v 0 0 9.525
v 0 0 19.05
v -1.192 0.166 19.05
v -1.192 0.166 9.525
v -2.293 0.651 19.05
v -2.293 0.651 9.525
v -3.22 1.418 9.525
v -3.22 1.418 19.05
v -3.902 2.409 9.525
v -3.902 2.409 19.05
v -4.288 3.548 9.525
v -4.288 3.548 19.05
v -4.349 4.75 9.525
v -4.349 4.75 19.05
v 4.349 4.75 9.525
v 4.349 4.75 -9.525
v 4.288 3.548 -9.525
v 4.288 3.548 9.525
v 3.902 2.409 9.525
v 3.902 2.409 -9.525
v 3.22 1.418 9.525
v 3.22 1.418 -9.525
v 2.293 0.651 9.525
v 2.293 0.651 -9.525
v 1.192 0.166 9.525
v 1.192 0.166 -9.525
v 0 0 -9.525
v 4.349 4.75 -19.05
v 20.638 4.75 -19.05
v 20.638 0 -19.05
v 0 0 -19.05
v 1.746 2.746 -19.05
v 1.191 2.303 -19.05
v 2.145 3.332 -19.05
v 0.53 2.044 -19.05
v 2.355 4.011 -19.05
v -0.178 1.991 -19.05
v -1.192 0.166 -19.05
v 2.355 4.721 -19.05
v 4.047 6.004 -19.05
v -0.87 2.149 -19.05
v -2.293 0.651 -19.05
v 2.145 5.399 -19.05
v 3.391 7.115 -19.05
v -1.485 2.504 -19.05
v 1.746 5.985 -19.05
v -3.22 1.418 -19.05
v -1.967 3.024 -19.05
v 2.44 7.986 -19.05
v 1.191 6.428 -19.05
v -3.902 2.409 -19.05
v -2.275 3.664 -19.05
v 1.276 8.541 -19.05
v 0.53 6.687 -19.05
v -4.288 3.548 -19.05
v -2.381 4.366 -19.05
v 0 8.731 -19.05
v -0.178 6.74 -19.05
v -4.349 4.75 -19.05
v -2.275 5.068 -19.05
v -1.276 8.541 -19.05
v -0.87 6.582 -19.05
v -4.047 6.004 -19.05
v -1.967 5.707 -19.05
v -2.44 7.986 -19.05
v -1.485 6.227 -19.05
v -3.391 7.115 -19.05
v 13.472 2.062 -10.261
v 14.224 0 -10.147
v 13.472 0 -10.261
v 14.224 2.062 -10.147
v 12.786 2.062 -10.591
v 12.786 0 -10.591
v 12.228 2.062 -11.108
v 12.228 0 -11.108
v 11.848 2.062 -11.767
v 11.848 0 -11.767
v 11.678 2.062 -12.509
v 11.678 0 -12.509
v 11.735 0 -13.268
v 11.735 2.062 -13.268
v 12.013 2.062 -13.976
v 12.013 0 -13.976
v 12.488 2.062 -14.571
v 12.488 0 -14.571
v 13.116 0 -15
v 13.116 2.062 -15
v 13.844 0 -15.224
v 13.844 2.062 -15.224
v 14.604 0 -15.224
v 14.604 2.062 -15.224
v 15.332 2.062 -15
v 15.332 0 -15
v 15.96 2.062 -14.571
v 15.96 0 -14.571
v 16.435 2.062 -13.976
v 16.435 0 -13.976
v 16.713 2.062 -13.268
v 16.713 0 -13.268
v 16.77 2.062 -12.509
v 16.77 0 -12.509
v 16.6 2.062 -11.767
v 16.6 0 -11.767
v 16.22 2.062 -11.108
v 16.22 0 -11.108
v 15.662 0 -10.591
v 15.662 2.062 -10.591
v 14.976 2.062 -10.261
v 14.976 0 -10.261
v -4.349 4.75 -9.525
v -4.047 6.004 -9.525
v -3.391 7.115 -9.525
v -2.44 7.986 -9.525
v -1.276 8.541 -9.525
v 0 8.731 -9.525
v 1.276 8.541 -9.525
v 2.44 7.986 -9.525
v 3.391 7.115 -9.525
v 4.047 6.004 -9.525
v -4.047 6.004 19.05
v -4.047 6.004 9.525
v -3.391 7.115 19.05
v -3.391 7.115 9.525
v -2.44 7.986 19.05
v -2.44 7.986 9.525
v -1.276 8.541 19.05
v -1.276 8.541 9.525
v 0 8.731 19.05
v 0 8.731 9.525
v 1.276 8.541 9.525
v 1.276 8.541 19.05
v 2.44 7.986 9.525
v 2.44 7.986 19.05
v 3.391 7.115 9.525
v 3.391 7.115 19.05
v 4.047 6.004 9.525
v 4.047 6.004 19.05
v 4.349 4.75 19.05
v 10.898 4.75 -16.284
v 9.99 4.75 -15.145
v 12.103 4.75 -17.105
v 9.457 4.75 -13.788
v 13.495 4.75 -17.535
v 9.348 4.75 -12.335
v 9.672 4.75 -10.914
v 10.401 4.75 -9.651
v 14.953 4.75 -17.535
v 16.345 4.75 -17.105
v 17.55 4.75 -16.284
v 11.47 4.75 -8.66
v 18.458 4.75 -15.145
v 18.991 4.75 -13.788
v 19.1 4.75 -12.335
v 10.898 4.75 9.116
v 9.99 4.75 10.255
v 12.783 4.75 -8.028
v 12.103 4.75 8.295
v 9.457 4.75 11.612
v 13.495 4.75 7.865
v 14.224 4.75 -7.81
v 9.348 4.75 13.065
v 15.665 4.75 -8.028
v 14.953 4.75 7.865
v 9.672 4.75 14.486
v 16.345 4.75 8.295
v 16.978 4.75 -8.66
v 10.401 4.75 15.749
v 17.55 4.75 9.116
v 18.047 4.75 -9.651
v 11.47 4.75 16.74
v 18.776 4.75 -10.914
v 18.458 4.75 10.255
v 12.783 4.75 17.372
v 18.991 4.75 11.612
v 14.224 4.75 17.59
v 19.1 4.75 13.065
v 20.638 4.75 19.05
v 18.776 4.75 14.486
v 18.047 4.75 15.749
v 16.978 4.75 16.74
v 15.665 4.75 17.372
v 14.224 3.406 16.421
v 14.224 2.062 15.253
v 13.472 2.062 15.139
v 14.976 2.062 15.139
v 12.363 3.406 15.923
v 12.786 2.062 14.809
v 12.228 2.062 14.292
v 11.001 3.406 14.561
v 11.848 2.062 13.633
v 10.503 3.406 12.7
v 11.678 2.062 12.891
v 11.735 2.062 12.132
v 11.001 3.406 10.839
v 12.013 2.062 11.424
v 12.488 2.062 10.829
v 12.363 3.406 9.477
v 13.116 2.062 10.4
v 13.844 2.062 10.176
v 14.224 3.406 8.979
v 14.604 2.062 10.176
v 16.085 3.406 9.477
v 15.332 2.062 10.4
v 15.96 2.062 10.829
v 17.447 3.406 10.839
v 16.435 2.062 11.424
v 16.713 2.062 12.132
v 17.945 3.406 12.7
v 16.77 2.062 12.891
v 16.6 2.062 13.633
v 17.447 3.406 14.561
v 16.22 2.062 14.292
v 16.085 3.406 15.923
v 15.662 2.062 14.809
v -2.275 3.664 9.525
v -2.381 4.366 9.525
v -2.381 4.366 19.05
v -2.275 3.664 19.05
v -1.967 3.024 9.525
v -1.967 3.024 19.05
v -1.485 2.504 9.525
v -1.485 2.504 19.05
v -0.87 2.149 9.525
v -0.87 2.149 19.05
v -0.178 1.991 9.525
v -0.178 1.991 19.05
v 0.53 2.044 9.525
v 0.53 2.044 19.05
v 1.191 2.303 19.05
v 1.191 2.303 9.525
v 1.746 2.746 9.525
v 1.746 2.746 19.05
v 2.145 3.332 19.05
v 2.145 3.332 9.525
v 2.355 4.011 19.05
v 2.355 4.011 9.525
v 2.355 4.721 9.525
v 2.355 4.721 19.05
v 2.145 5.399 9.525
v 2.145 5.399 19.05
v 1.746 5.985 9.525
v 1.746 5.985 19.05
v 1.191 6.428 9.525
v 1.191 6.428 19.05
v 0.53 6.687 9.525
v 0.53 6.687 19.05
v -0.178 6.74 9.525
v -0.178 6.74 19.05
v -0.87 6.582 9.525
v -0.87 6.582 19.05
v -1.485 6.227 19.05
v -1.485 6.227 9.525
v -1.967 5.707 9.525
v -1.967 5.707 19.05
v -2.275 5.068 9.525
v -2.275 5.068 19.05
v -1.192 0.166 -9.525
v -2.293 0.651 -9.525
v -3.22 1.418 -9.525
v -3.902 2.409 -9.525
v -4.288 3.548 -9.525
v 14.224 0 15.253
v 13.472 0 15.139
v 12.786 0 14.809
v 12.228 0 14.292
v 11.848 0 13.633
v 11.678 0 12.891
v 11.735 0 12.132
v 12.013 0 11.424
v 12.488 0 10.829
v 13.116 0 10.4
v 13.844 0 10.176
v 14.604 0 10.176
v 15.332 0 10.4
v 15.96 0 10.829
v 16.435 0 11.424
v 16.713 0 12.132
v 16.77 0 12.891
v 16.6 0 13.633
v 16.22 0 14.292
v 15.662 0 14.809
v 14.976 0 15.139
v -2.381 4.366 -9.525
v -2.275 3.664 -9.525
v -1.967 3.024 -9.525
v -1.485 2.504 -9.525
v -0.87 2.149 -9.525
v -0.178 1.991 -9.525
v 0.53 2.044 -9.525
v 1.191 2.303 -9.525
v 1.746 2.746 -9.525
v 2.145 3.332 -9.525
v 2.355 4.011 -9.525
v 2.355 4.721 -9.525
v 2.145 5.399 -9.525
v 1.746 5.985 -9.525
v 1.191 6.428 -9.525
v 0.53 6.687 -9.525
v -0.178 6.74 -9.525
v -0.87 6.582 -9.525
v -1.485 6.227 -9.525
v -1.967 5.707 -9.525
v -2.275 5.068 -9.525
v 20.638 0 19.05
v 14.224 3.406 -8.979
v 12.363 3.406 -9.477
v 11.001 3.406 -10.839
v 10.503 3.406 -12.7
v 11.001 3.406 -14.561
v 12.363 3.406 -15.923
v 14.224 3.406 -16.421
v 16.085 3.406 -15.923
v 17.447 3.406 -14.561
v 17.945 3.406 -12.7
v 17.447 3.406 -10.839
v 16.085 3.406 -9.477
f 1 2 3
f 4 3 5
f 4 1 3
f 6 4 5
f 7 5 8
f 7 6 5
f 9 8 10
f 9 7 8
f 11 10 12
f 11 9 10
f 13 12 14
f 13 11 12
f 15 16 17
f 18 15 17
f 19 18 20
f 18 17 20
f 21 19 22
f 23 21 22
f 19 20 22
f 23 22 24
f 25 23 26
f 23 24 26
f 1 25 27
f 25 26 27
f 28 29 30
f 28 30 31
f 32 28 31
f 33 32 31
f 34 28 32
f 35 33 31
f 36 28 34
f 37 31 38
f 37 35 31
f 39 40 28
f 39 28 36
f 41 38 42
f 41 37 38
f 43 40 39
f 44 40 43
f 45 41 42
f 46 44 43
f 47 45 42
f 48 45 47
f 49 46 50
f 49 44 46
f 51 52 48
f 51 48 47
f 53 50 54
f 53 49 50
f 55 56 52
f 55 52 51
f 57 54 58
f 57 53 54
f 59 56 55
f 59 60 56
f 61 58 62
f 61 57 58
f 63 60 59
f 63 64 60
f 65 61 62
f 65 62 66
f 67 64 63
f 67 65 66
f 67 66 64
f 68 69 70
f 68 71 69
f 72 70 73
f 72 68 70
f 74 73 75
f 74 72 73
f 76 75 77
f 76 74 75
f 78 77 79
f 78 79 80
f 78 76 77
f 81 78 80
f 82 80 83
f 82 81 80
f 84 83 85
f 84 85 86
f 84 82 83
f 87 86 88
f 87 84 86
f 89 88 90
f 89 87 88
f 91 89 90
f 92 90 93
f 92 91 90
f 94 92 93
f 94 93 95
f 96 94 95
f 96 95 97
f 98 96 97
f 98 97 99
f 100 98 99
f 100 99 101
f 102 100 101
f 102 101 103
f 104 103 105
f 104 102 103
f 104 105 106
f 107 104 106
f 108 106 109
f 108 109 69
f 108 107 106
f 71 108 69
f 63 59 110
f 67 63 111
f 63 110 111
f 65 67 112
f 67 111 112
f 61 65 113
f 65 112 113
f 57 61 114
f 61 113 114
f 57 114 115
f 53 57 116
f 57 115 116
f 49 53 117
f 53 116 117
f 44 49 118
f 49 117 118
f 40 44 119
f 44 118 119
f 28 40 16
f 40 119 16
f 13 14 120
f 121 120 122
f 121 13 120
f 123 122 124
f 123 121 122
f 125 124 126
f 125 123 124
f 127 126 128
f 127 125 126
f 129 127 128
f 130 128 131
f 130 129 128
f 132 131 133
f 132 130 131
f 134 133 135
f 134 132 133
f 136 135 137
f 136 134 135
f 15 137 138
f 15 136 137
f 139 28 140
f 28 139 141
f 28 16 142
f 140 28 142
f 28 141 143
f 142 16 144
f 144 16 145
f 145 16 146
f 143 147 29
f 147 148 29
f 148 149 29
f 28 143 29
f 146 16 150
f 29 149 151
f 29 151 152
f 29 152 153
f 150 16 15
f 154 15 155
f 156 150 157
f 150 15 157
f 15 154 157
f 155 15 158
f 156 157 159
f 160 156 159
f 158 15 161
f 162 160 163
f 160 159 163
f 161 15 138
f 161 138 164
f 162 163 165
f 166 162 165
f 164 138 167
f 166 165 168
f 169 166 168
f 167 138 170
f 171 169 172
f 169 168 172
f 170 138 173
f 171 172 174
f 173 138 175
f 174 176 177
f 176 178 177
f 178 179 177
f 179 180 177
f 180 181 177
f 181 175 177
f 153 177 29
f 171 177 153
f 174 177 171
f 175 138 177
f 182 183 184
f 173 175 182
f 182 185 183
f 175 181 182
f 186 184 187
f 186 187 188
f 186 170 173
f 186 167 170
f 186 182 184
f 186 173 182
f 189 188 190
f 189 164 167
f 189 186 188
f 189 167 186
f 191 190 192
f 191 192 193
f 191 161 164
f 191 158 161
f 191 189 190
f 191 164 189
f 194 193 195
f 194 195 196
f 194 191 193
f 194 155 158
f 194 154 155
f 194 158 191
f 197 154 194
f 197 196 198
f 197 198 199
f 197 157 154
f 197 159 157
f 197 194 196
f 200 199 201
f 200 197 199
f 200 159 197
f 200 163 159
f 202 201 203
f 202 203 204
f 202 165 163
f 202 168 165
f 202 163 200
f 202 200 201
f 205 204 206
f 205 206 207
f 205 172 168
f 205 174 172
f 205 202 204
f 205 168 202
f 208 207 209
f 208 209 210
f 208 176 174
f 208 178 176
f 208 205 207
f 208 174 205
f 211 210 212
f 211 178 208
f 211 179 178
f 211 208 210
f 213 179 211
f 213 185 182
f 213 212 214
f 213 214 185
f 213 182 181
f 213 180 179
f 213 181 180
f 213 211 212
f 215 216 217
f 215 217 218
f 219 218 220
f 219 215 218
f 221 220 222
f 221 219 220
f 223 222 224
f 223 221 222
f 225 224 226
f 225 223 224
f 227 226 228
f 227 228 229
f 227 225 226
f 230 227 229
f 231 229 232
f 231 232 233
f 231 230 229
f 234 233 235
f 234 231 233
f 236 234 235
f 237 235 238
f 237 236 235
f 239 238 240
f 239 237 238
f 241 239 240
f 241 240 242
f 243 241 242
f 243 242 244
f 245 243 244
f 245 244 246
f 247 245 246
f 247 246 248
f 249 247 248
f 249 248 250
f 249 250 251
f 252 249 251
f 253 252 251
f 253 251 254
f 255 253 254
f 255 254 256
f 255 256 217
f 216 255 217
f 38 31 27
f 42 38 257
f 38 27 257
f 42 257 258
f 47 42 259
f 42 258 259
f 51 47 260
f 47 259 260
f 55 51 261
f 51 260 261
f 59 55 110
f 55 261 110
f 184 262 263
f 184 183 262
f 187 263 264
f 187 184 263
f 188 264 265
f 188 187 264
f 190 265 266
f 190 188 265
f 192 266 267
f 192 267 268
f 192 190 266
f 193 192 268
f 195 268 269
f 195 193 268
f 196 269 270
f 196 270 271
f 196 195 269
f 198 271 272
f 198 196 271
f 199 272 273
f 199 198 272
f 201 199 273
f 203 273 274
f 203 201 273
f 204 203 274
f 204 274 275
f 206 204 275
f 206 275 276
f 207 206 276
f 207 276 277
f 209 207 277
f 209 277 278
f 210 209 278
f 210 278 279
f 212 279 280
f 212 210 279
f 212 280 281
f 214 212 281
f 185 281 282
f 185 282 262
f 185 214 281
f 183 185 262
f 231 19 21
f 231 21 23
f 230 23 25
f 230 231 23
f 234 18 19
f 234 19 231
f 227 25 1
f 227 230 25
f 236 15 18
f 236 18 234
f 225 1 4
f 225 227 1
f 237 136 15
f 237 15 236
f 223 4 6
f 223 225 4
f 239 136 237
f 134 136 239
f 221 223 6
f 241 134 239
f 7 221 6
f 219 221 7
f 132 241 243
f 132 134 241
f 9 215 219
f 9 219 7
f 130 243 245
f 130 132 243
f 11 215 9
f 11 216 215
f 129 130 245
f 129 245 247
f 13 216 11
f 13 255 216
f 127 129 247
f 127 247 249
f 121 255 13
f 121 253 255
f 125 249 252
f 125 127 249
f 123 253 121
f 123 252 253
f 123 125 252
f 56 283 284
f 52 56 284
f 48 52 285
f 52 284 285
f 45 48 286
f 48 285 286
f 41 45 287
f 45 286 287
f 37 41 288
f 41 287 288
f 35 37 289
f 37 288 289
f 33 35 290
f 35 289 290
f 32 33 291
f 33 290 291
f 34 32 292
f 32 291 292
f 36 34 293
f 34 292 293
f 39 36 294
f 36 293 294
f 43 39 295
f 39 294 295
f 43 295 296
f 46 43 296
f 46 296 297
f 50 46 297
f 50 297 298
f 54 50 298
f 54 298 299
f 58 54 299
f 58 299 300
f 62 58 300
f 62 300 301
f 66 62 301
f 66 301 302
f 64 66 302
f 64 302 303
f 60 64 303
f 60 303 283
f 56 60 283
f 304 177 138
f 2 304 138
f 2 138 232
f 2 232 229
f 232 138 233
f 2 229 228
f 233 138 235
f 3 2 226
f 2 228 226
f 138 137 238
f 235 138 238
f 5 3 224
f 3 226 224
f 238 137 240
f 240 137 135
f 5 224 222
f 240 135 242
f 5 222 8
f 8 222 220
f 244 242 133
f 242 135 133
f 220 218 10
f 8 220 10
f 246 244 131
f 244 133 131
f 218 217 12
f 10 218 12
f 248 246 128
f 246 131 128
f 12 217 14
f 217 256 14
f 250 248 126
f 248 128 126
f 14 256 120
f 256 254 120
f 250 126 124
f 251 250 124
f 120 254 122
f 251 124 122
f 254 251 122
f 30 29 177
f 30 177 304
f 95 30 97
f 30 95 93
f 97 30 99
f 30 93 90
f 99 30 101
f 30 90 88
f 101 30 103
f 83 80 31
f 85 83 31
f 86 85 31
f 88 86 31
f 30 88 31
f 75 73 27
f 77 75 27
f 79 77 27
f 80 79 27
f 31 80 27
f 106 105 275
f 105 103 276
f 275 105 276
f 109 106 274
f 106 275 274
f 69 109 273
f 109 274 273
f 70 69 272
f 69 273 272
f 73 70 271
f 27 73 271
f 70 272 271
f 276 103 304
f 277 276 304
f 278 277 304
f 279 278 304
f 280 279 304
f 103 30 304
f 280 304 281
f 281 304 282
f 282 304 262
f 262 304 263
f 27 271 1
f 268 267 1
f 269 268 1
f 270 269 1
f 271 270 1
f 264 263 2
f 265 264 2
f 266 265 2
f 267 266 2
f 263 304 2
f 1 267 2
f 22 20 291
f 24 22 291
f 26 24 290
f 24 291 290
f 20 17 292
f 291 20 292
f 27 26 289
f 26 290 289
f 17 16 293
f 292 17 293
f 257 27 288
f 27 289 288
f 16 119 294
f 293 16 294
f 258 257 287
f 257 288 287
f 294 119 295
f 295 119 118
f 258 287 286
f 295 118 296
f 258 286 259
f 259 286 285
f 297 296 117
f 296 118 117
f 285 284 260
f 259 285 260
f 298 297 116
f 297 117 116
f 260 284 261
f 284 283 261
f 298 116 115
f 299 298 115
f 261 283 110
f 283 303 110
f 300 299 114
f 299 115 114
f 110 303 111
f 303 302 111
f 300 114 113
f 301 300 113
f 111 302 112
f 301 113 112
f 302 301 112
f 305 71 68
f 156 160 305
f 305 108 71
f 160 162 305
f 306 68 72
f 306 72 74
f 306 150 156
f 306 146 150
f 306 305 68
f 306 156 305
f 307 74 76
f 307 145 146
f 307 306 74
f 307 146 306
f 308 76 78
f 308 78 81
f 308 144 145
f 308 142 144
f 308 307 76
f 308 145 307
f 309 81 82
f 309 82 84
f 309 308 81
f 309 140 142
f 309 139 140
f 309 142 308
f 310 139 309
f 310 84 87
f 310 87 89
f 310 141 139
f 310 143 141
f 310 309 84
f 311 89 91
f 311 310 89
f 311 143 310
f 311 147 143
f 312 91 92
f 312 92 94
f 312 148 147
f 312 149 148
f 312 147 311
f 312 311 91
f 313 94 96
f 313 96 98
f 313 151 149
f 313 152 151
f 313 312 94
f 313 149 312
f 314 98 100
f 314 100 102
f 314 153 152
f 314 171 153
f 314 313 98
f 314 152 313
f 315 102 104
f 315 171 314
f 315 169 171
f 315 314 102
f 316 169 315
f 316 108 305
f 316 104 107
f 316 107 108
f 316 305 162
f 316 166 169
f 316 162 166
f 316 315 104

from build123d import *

# Parameters (mm, degrees)
SKETCH1_R                                    = 2.38125
EXTRUDE1_DEPTH                               = 19.05
CSK_FOR_10_FLAT_HEAD_MACHINE_SCREW1_AT_COUNT = 2
CSK_FOR_10_FLAT_HEAD_MACHINE_SCREW1_AT_PITCH = 25.4
CUT_EXTRUDE1_DEPTH                           = 19.05


with BuildPart() as part:
    # Sketch1 → Extrude1 (new, symmetric)
    with BuildSketch(Plane.XY):
        with BuildLine():
            Line((4.348688447, 4.7498), (20.6375, 4.7498))
            Line((20.6375, 4.7498), (20.6375, 0))
            Line((20.6375, 0), (0, 0))
            ThreePointArc((0, 0), (-3.219925902, 1.417615701), (-4.348688447, 4.7498))
            ThreePointArc((-4.348688447, 4.7498), (0, 8.73125), (4.348688447, 4.7498))
        make_face()
        with Locations(Location((0, 4.365625, 0), (0, 0, 180))):
            Circle(SKETCH1_R, mode=Mode.SUBTRACT)
    extrude(amount=EXTRUDE1_DEPTH, both=True)

    # Sketch6 → CSK for #10 Flat Head Machine Screw1 (revolve, cut)
    with BuildSketch(Plane(origin=(14.224, 4.7498, 12.7), x_dir=(0, 0, 1), z_dir=(1, 0, 0))):
        Polygon((0, 0), (0, 4.7498), (2.5527, 4.7498), (2.5527, 2.688180894), (4.8895, 0), align=None)
    csk_for_10_flat_head_machine_screw1 = revolve(axis=Axis((14.224, 11.0998, 12.7), (0, -1, 0)), mode=Mode.SUBTRACT)

    # CSK for #10 Flat Head Machine Screw1 at: CSK for #10 Flat Head Machine Screw1 ×2
    with Locations(*[(0, 0, -i * CSK_FOR_10_FLAT_HEAD_MACHINE_SCREW1_AT_PITCH) for i in range(1, CSK_FOR_10_FLAT_HEAD_MACHINE_SCREW1_AT_COUNT)]):
        add(csk_for_10_flat_head_machine_screw1, mode=Mode.SUBTRACT)

    # Sketch8 → Cut-Extrude1 (cut)
    with BuildSketch(Plane(origin=(0, 0, -9.525), x_dir=(-1, 0, 0), z_dir=(0, 0, -1))):
        with BuildLine():
            ThreePointArc((-4.348688447, 4.7498), (-3.219925902, 1.417615701), (0, 0))
            ThreePointArc((0, 0), (3.219925902, 7.313634299), (-4.348688447, 4.7498))
        make_face()
    extrude(amount=-CUT_EXTRUDE1_DEPTH, mode=Mode.SUBTRACT)


solid = part.part
